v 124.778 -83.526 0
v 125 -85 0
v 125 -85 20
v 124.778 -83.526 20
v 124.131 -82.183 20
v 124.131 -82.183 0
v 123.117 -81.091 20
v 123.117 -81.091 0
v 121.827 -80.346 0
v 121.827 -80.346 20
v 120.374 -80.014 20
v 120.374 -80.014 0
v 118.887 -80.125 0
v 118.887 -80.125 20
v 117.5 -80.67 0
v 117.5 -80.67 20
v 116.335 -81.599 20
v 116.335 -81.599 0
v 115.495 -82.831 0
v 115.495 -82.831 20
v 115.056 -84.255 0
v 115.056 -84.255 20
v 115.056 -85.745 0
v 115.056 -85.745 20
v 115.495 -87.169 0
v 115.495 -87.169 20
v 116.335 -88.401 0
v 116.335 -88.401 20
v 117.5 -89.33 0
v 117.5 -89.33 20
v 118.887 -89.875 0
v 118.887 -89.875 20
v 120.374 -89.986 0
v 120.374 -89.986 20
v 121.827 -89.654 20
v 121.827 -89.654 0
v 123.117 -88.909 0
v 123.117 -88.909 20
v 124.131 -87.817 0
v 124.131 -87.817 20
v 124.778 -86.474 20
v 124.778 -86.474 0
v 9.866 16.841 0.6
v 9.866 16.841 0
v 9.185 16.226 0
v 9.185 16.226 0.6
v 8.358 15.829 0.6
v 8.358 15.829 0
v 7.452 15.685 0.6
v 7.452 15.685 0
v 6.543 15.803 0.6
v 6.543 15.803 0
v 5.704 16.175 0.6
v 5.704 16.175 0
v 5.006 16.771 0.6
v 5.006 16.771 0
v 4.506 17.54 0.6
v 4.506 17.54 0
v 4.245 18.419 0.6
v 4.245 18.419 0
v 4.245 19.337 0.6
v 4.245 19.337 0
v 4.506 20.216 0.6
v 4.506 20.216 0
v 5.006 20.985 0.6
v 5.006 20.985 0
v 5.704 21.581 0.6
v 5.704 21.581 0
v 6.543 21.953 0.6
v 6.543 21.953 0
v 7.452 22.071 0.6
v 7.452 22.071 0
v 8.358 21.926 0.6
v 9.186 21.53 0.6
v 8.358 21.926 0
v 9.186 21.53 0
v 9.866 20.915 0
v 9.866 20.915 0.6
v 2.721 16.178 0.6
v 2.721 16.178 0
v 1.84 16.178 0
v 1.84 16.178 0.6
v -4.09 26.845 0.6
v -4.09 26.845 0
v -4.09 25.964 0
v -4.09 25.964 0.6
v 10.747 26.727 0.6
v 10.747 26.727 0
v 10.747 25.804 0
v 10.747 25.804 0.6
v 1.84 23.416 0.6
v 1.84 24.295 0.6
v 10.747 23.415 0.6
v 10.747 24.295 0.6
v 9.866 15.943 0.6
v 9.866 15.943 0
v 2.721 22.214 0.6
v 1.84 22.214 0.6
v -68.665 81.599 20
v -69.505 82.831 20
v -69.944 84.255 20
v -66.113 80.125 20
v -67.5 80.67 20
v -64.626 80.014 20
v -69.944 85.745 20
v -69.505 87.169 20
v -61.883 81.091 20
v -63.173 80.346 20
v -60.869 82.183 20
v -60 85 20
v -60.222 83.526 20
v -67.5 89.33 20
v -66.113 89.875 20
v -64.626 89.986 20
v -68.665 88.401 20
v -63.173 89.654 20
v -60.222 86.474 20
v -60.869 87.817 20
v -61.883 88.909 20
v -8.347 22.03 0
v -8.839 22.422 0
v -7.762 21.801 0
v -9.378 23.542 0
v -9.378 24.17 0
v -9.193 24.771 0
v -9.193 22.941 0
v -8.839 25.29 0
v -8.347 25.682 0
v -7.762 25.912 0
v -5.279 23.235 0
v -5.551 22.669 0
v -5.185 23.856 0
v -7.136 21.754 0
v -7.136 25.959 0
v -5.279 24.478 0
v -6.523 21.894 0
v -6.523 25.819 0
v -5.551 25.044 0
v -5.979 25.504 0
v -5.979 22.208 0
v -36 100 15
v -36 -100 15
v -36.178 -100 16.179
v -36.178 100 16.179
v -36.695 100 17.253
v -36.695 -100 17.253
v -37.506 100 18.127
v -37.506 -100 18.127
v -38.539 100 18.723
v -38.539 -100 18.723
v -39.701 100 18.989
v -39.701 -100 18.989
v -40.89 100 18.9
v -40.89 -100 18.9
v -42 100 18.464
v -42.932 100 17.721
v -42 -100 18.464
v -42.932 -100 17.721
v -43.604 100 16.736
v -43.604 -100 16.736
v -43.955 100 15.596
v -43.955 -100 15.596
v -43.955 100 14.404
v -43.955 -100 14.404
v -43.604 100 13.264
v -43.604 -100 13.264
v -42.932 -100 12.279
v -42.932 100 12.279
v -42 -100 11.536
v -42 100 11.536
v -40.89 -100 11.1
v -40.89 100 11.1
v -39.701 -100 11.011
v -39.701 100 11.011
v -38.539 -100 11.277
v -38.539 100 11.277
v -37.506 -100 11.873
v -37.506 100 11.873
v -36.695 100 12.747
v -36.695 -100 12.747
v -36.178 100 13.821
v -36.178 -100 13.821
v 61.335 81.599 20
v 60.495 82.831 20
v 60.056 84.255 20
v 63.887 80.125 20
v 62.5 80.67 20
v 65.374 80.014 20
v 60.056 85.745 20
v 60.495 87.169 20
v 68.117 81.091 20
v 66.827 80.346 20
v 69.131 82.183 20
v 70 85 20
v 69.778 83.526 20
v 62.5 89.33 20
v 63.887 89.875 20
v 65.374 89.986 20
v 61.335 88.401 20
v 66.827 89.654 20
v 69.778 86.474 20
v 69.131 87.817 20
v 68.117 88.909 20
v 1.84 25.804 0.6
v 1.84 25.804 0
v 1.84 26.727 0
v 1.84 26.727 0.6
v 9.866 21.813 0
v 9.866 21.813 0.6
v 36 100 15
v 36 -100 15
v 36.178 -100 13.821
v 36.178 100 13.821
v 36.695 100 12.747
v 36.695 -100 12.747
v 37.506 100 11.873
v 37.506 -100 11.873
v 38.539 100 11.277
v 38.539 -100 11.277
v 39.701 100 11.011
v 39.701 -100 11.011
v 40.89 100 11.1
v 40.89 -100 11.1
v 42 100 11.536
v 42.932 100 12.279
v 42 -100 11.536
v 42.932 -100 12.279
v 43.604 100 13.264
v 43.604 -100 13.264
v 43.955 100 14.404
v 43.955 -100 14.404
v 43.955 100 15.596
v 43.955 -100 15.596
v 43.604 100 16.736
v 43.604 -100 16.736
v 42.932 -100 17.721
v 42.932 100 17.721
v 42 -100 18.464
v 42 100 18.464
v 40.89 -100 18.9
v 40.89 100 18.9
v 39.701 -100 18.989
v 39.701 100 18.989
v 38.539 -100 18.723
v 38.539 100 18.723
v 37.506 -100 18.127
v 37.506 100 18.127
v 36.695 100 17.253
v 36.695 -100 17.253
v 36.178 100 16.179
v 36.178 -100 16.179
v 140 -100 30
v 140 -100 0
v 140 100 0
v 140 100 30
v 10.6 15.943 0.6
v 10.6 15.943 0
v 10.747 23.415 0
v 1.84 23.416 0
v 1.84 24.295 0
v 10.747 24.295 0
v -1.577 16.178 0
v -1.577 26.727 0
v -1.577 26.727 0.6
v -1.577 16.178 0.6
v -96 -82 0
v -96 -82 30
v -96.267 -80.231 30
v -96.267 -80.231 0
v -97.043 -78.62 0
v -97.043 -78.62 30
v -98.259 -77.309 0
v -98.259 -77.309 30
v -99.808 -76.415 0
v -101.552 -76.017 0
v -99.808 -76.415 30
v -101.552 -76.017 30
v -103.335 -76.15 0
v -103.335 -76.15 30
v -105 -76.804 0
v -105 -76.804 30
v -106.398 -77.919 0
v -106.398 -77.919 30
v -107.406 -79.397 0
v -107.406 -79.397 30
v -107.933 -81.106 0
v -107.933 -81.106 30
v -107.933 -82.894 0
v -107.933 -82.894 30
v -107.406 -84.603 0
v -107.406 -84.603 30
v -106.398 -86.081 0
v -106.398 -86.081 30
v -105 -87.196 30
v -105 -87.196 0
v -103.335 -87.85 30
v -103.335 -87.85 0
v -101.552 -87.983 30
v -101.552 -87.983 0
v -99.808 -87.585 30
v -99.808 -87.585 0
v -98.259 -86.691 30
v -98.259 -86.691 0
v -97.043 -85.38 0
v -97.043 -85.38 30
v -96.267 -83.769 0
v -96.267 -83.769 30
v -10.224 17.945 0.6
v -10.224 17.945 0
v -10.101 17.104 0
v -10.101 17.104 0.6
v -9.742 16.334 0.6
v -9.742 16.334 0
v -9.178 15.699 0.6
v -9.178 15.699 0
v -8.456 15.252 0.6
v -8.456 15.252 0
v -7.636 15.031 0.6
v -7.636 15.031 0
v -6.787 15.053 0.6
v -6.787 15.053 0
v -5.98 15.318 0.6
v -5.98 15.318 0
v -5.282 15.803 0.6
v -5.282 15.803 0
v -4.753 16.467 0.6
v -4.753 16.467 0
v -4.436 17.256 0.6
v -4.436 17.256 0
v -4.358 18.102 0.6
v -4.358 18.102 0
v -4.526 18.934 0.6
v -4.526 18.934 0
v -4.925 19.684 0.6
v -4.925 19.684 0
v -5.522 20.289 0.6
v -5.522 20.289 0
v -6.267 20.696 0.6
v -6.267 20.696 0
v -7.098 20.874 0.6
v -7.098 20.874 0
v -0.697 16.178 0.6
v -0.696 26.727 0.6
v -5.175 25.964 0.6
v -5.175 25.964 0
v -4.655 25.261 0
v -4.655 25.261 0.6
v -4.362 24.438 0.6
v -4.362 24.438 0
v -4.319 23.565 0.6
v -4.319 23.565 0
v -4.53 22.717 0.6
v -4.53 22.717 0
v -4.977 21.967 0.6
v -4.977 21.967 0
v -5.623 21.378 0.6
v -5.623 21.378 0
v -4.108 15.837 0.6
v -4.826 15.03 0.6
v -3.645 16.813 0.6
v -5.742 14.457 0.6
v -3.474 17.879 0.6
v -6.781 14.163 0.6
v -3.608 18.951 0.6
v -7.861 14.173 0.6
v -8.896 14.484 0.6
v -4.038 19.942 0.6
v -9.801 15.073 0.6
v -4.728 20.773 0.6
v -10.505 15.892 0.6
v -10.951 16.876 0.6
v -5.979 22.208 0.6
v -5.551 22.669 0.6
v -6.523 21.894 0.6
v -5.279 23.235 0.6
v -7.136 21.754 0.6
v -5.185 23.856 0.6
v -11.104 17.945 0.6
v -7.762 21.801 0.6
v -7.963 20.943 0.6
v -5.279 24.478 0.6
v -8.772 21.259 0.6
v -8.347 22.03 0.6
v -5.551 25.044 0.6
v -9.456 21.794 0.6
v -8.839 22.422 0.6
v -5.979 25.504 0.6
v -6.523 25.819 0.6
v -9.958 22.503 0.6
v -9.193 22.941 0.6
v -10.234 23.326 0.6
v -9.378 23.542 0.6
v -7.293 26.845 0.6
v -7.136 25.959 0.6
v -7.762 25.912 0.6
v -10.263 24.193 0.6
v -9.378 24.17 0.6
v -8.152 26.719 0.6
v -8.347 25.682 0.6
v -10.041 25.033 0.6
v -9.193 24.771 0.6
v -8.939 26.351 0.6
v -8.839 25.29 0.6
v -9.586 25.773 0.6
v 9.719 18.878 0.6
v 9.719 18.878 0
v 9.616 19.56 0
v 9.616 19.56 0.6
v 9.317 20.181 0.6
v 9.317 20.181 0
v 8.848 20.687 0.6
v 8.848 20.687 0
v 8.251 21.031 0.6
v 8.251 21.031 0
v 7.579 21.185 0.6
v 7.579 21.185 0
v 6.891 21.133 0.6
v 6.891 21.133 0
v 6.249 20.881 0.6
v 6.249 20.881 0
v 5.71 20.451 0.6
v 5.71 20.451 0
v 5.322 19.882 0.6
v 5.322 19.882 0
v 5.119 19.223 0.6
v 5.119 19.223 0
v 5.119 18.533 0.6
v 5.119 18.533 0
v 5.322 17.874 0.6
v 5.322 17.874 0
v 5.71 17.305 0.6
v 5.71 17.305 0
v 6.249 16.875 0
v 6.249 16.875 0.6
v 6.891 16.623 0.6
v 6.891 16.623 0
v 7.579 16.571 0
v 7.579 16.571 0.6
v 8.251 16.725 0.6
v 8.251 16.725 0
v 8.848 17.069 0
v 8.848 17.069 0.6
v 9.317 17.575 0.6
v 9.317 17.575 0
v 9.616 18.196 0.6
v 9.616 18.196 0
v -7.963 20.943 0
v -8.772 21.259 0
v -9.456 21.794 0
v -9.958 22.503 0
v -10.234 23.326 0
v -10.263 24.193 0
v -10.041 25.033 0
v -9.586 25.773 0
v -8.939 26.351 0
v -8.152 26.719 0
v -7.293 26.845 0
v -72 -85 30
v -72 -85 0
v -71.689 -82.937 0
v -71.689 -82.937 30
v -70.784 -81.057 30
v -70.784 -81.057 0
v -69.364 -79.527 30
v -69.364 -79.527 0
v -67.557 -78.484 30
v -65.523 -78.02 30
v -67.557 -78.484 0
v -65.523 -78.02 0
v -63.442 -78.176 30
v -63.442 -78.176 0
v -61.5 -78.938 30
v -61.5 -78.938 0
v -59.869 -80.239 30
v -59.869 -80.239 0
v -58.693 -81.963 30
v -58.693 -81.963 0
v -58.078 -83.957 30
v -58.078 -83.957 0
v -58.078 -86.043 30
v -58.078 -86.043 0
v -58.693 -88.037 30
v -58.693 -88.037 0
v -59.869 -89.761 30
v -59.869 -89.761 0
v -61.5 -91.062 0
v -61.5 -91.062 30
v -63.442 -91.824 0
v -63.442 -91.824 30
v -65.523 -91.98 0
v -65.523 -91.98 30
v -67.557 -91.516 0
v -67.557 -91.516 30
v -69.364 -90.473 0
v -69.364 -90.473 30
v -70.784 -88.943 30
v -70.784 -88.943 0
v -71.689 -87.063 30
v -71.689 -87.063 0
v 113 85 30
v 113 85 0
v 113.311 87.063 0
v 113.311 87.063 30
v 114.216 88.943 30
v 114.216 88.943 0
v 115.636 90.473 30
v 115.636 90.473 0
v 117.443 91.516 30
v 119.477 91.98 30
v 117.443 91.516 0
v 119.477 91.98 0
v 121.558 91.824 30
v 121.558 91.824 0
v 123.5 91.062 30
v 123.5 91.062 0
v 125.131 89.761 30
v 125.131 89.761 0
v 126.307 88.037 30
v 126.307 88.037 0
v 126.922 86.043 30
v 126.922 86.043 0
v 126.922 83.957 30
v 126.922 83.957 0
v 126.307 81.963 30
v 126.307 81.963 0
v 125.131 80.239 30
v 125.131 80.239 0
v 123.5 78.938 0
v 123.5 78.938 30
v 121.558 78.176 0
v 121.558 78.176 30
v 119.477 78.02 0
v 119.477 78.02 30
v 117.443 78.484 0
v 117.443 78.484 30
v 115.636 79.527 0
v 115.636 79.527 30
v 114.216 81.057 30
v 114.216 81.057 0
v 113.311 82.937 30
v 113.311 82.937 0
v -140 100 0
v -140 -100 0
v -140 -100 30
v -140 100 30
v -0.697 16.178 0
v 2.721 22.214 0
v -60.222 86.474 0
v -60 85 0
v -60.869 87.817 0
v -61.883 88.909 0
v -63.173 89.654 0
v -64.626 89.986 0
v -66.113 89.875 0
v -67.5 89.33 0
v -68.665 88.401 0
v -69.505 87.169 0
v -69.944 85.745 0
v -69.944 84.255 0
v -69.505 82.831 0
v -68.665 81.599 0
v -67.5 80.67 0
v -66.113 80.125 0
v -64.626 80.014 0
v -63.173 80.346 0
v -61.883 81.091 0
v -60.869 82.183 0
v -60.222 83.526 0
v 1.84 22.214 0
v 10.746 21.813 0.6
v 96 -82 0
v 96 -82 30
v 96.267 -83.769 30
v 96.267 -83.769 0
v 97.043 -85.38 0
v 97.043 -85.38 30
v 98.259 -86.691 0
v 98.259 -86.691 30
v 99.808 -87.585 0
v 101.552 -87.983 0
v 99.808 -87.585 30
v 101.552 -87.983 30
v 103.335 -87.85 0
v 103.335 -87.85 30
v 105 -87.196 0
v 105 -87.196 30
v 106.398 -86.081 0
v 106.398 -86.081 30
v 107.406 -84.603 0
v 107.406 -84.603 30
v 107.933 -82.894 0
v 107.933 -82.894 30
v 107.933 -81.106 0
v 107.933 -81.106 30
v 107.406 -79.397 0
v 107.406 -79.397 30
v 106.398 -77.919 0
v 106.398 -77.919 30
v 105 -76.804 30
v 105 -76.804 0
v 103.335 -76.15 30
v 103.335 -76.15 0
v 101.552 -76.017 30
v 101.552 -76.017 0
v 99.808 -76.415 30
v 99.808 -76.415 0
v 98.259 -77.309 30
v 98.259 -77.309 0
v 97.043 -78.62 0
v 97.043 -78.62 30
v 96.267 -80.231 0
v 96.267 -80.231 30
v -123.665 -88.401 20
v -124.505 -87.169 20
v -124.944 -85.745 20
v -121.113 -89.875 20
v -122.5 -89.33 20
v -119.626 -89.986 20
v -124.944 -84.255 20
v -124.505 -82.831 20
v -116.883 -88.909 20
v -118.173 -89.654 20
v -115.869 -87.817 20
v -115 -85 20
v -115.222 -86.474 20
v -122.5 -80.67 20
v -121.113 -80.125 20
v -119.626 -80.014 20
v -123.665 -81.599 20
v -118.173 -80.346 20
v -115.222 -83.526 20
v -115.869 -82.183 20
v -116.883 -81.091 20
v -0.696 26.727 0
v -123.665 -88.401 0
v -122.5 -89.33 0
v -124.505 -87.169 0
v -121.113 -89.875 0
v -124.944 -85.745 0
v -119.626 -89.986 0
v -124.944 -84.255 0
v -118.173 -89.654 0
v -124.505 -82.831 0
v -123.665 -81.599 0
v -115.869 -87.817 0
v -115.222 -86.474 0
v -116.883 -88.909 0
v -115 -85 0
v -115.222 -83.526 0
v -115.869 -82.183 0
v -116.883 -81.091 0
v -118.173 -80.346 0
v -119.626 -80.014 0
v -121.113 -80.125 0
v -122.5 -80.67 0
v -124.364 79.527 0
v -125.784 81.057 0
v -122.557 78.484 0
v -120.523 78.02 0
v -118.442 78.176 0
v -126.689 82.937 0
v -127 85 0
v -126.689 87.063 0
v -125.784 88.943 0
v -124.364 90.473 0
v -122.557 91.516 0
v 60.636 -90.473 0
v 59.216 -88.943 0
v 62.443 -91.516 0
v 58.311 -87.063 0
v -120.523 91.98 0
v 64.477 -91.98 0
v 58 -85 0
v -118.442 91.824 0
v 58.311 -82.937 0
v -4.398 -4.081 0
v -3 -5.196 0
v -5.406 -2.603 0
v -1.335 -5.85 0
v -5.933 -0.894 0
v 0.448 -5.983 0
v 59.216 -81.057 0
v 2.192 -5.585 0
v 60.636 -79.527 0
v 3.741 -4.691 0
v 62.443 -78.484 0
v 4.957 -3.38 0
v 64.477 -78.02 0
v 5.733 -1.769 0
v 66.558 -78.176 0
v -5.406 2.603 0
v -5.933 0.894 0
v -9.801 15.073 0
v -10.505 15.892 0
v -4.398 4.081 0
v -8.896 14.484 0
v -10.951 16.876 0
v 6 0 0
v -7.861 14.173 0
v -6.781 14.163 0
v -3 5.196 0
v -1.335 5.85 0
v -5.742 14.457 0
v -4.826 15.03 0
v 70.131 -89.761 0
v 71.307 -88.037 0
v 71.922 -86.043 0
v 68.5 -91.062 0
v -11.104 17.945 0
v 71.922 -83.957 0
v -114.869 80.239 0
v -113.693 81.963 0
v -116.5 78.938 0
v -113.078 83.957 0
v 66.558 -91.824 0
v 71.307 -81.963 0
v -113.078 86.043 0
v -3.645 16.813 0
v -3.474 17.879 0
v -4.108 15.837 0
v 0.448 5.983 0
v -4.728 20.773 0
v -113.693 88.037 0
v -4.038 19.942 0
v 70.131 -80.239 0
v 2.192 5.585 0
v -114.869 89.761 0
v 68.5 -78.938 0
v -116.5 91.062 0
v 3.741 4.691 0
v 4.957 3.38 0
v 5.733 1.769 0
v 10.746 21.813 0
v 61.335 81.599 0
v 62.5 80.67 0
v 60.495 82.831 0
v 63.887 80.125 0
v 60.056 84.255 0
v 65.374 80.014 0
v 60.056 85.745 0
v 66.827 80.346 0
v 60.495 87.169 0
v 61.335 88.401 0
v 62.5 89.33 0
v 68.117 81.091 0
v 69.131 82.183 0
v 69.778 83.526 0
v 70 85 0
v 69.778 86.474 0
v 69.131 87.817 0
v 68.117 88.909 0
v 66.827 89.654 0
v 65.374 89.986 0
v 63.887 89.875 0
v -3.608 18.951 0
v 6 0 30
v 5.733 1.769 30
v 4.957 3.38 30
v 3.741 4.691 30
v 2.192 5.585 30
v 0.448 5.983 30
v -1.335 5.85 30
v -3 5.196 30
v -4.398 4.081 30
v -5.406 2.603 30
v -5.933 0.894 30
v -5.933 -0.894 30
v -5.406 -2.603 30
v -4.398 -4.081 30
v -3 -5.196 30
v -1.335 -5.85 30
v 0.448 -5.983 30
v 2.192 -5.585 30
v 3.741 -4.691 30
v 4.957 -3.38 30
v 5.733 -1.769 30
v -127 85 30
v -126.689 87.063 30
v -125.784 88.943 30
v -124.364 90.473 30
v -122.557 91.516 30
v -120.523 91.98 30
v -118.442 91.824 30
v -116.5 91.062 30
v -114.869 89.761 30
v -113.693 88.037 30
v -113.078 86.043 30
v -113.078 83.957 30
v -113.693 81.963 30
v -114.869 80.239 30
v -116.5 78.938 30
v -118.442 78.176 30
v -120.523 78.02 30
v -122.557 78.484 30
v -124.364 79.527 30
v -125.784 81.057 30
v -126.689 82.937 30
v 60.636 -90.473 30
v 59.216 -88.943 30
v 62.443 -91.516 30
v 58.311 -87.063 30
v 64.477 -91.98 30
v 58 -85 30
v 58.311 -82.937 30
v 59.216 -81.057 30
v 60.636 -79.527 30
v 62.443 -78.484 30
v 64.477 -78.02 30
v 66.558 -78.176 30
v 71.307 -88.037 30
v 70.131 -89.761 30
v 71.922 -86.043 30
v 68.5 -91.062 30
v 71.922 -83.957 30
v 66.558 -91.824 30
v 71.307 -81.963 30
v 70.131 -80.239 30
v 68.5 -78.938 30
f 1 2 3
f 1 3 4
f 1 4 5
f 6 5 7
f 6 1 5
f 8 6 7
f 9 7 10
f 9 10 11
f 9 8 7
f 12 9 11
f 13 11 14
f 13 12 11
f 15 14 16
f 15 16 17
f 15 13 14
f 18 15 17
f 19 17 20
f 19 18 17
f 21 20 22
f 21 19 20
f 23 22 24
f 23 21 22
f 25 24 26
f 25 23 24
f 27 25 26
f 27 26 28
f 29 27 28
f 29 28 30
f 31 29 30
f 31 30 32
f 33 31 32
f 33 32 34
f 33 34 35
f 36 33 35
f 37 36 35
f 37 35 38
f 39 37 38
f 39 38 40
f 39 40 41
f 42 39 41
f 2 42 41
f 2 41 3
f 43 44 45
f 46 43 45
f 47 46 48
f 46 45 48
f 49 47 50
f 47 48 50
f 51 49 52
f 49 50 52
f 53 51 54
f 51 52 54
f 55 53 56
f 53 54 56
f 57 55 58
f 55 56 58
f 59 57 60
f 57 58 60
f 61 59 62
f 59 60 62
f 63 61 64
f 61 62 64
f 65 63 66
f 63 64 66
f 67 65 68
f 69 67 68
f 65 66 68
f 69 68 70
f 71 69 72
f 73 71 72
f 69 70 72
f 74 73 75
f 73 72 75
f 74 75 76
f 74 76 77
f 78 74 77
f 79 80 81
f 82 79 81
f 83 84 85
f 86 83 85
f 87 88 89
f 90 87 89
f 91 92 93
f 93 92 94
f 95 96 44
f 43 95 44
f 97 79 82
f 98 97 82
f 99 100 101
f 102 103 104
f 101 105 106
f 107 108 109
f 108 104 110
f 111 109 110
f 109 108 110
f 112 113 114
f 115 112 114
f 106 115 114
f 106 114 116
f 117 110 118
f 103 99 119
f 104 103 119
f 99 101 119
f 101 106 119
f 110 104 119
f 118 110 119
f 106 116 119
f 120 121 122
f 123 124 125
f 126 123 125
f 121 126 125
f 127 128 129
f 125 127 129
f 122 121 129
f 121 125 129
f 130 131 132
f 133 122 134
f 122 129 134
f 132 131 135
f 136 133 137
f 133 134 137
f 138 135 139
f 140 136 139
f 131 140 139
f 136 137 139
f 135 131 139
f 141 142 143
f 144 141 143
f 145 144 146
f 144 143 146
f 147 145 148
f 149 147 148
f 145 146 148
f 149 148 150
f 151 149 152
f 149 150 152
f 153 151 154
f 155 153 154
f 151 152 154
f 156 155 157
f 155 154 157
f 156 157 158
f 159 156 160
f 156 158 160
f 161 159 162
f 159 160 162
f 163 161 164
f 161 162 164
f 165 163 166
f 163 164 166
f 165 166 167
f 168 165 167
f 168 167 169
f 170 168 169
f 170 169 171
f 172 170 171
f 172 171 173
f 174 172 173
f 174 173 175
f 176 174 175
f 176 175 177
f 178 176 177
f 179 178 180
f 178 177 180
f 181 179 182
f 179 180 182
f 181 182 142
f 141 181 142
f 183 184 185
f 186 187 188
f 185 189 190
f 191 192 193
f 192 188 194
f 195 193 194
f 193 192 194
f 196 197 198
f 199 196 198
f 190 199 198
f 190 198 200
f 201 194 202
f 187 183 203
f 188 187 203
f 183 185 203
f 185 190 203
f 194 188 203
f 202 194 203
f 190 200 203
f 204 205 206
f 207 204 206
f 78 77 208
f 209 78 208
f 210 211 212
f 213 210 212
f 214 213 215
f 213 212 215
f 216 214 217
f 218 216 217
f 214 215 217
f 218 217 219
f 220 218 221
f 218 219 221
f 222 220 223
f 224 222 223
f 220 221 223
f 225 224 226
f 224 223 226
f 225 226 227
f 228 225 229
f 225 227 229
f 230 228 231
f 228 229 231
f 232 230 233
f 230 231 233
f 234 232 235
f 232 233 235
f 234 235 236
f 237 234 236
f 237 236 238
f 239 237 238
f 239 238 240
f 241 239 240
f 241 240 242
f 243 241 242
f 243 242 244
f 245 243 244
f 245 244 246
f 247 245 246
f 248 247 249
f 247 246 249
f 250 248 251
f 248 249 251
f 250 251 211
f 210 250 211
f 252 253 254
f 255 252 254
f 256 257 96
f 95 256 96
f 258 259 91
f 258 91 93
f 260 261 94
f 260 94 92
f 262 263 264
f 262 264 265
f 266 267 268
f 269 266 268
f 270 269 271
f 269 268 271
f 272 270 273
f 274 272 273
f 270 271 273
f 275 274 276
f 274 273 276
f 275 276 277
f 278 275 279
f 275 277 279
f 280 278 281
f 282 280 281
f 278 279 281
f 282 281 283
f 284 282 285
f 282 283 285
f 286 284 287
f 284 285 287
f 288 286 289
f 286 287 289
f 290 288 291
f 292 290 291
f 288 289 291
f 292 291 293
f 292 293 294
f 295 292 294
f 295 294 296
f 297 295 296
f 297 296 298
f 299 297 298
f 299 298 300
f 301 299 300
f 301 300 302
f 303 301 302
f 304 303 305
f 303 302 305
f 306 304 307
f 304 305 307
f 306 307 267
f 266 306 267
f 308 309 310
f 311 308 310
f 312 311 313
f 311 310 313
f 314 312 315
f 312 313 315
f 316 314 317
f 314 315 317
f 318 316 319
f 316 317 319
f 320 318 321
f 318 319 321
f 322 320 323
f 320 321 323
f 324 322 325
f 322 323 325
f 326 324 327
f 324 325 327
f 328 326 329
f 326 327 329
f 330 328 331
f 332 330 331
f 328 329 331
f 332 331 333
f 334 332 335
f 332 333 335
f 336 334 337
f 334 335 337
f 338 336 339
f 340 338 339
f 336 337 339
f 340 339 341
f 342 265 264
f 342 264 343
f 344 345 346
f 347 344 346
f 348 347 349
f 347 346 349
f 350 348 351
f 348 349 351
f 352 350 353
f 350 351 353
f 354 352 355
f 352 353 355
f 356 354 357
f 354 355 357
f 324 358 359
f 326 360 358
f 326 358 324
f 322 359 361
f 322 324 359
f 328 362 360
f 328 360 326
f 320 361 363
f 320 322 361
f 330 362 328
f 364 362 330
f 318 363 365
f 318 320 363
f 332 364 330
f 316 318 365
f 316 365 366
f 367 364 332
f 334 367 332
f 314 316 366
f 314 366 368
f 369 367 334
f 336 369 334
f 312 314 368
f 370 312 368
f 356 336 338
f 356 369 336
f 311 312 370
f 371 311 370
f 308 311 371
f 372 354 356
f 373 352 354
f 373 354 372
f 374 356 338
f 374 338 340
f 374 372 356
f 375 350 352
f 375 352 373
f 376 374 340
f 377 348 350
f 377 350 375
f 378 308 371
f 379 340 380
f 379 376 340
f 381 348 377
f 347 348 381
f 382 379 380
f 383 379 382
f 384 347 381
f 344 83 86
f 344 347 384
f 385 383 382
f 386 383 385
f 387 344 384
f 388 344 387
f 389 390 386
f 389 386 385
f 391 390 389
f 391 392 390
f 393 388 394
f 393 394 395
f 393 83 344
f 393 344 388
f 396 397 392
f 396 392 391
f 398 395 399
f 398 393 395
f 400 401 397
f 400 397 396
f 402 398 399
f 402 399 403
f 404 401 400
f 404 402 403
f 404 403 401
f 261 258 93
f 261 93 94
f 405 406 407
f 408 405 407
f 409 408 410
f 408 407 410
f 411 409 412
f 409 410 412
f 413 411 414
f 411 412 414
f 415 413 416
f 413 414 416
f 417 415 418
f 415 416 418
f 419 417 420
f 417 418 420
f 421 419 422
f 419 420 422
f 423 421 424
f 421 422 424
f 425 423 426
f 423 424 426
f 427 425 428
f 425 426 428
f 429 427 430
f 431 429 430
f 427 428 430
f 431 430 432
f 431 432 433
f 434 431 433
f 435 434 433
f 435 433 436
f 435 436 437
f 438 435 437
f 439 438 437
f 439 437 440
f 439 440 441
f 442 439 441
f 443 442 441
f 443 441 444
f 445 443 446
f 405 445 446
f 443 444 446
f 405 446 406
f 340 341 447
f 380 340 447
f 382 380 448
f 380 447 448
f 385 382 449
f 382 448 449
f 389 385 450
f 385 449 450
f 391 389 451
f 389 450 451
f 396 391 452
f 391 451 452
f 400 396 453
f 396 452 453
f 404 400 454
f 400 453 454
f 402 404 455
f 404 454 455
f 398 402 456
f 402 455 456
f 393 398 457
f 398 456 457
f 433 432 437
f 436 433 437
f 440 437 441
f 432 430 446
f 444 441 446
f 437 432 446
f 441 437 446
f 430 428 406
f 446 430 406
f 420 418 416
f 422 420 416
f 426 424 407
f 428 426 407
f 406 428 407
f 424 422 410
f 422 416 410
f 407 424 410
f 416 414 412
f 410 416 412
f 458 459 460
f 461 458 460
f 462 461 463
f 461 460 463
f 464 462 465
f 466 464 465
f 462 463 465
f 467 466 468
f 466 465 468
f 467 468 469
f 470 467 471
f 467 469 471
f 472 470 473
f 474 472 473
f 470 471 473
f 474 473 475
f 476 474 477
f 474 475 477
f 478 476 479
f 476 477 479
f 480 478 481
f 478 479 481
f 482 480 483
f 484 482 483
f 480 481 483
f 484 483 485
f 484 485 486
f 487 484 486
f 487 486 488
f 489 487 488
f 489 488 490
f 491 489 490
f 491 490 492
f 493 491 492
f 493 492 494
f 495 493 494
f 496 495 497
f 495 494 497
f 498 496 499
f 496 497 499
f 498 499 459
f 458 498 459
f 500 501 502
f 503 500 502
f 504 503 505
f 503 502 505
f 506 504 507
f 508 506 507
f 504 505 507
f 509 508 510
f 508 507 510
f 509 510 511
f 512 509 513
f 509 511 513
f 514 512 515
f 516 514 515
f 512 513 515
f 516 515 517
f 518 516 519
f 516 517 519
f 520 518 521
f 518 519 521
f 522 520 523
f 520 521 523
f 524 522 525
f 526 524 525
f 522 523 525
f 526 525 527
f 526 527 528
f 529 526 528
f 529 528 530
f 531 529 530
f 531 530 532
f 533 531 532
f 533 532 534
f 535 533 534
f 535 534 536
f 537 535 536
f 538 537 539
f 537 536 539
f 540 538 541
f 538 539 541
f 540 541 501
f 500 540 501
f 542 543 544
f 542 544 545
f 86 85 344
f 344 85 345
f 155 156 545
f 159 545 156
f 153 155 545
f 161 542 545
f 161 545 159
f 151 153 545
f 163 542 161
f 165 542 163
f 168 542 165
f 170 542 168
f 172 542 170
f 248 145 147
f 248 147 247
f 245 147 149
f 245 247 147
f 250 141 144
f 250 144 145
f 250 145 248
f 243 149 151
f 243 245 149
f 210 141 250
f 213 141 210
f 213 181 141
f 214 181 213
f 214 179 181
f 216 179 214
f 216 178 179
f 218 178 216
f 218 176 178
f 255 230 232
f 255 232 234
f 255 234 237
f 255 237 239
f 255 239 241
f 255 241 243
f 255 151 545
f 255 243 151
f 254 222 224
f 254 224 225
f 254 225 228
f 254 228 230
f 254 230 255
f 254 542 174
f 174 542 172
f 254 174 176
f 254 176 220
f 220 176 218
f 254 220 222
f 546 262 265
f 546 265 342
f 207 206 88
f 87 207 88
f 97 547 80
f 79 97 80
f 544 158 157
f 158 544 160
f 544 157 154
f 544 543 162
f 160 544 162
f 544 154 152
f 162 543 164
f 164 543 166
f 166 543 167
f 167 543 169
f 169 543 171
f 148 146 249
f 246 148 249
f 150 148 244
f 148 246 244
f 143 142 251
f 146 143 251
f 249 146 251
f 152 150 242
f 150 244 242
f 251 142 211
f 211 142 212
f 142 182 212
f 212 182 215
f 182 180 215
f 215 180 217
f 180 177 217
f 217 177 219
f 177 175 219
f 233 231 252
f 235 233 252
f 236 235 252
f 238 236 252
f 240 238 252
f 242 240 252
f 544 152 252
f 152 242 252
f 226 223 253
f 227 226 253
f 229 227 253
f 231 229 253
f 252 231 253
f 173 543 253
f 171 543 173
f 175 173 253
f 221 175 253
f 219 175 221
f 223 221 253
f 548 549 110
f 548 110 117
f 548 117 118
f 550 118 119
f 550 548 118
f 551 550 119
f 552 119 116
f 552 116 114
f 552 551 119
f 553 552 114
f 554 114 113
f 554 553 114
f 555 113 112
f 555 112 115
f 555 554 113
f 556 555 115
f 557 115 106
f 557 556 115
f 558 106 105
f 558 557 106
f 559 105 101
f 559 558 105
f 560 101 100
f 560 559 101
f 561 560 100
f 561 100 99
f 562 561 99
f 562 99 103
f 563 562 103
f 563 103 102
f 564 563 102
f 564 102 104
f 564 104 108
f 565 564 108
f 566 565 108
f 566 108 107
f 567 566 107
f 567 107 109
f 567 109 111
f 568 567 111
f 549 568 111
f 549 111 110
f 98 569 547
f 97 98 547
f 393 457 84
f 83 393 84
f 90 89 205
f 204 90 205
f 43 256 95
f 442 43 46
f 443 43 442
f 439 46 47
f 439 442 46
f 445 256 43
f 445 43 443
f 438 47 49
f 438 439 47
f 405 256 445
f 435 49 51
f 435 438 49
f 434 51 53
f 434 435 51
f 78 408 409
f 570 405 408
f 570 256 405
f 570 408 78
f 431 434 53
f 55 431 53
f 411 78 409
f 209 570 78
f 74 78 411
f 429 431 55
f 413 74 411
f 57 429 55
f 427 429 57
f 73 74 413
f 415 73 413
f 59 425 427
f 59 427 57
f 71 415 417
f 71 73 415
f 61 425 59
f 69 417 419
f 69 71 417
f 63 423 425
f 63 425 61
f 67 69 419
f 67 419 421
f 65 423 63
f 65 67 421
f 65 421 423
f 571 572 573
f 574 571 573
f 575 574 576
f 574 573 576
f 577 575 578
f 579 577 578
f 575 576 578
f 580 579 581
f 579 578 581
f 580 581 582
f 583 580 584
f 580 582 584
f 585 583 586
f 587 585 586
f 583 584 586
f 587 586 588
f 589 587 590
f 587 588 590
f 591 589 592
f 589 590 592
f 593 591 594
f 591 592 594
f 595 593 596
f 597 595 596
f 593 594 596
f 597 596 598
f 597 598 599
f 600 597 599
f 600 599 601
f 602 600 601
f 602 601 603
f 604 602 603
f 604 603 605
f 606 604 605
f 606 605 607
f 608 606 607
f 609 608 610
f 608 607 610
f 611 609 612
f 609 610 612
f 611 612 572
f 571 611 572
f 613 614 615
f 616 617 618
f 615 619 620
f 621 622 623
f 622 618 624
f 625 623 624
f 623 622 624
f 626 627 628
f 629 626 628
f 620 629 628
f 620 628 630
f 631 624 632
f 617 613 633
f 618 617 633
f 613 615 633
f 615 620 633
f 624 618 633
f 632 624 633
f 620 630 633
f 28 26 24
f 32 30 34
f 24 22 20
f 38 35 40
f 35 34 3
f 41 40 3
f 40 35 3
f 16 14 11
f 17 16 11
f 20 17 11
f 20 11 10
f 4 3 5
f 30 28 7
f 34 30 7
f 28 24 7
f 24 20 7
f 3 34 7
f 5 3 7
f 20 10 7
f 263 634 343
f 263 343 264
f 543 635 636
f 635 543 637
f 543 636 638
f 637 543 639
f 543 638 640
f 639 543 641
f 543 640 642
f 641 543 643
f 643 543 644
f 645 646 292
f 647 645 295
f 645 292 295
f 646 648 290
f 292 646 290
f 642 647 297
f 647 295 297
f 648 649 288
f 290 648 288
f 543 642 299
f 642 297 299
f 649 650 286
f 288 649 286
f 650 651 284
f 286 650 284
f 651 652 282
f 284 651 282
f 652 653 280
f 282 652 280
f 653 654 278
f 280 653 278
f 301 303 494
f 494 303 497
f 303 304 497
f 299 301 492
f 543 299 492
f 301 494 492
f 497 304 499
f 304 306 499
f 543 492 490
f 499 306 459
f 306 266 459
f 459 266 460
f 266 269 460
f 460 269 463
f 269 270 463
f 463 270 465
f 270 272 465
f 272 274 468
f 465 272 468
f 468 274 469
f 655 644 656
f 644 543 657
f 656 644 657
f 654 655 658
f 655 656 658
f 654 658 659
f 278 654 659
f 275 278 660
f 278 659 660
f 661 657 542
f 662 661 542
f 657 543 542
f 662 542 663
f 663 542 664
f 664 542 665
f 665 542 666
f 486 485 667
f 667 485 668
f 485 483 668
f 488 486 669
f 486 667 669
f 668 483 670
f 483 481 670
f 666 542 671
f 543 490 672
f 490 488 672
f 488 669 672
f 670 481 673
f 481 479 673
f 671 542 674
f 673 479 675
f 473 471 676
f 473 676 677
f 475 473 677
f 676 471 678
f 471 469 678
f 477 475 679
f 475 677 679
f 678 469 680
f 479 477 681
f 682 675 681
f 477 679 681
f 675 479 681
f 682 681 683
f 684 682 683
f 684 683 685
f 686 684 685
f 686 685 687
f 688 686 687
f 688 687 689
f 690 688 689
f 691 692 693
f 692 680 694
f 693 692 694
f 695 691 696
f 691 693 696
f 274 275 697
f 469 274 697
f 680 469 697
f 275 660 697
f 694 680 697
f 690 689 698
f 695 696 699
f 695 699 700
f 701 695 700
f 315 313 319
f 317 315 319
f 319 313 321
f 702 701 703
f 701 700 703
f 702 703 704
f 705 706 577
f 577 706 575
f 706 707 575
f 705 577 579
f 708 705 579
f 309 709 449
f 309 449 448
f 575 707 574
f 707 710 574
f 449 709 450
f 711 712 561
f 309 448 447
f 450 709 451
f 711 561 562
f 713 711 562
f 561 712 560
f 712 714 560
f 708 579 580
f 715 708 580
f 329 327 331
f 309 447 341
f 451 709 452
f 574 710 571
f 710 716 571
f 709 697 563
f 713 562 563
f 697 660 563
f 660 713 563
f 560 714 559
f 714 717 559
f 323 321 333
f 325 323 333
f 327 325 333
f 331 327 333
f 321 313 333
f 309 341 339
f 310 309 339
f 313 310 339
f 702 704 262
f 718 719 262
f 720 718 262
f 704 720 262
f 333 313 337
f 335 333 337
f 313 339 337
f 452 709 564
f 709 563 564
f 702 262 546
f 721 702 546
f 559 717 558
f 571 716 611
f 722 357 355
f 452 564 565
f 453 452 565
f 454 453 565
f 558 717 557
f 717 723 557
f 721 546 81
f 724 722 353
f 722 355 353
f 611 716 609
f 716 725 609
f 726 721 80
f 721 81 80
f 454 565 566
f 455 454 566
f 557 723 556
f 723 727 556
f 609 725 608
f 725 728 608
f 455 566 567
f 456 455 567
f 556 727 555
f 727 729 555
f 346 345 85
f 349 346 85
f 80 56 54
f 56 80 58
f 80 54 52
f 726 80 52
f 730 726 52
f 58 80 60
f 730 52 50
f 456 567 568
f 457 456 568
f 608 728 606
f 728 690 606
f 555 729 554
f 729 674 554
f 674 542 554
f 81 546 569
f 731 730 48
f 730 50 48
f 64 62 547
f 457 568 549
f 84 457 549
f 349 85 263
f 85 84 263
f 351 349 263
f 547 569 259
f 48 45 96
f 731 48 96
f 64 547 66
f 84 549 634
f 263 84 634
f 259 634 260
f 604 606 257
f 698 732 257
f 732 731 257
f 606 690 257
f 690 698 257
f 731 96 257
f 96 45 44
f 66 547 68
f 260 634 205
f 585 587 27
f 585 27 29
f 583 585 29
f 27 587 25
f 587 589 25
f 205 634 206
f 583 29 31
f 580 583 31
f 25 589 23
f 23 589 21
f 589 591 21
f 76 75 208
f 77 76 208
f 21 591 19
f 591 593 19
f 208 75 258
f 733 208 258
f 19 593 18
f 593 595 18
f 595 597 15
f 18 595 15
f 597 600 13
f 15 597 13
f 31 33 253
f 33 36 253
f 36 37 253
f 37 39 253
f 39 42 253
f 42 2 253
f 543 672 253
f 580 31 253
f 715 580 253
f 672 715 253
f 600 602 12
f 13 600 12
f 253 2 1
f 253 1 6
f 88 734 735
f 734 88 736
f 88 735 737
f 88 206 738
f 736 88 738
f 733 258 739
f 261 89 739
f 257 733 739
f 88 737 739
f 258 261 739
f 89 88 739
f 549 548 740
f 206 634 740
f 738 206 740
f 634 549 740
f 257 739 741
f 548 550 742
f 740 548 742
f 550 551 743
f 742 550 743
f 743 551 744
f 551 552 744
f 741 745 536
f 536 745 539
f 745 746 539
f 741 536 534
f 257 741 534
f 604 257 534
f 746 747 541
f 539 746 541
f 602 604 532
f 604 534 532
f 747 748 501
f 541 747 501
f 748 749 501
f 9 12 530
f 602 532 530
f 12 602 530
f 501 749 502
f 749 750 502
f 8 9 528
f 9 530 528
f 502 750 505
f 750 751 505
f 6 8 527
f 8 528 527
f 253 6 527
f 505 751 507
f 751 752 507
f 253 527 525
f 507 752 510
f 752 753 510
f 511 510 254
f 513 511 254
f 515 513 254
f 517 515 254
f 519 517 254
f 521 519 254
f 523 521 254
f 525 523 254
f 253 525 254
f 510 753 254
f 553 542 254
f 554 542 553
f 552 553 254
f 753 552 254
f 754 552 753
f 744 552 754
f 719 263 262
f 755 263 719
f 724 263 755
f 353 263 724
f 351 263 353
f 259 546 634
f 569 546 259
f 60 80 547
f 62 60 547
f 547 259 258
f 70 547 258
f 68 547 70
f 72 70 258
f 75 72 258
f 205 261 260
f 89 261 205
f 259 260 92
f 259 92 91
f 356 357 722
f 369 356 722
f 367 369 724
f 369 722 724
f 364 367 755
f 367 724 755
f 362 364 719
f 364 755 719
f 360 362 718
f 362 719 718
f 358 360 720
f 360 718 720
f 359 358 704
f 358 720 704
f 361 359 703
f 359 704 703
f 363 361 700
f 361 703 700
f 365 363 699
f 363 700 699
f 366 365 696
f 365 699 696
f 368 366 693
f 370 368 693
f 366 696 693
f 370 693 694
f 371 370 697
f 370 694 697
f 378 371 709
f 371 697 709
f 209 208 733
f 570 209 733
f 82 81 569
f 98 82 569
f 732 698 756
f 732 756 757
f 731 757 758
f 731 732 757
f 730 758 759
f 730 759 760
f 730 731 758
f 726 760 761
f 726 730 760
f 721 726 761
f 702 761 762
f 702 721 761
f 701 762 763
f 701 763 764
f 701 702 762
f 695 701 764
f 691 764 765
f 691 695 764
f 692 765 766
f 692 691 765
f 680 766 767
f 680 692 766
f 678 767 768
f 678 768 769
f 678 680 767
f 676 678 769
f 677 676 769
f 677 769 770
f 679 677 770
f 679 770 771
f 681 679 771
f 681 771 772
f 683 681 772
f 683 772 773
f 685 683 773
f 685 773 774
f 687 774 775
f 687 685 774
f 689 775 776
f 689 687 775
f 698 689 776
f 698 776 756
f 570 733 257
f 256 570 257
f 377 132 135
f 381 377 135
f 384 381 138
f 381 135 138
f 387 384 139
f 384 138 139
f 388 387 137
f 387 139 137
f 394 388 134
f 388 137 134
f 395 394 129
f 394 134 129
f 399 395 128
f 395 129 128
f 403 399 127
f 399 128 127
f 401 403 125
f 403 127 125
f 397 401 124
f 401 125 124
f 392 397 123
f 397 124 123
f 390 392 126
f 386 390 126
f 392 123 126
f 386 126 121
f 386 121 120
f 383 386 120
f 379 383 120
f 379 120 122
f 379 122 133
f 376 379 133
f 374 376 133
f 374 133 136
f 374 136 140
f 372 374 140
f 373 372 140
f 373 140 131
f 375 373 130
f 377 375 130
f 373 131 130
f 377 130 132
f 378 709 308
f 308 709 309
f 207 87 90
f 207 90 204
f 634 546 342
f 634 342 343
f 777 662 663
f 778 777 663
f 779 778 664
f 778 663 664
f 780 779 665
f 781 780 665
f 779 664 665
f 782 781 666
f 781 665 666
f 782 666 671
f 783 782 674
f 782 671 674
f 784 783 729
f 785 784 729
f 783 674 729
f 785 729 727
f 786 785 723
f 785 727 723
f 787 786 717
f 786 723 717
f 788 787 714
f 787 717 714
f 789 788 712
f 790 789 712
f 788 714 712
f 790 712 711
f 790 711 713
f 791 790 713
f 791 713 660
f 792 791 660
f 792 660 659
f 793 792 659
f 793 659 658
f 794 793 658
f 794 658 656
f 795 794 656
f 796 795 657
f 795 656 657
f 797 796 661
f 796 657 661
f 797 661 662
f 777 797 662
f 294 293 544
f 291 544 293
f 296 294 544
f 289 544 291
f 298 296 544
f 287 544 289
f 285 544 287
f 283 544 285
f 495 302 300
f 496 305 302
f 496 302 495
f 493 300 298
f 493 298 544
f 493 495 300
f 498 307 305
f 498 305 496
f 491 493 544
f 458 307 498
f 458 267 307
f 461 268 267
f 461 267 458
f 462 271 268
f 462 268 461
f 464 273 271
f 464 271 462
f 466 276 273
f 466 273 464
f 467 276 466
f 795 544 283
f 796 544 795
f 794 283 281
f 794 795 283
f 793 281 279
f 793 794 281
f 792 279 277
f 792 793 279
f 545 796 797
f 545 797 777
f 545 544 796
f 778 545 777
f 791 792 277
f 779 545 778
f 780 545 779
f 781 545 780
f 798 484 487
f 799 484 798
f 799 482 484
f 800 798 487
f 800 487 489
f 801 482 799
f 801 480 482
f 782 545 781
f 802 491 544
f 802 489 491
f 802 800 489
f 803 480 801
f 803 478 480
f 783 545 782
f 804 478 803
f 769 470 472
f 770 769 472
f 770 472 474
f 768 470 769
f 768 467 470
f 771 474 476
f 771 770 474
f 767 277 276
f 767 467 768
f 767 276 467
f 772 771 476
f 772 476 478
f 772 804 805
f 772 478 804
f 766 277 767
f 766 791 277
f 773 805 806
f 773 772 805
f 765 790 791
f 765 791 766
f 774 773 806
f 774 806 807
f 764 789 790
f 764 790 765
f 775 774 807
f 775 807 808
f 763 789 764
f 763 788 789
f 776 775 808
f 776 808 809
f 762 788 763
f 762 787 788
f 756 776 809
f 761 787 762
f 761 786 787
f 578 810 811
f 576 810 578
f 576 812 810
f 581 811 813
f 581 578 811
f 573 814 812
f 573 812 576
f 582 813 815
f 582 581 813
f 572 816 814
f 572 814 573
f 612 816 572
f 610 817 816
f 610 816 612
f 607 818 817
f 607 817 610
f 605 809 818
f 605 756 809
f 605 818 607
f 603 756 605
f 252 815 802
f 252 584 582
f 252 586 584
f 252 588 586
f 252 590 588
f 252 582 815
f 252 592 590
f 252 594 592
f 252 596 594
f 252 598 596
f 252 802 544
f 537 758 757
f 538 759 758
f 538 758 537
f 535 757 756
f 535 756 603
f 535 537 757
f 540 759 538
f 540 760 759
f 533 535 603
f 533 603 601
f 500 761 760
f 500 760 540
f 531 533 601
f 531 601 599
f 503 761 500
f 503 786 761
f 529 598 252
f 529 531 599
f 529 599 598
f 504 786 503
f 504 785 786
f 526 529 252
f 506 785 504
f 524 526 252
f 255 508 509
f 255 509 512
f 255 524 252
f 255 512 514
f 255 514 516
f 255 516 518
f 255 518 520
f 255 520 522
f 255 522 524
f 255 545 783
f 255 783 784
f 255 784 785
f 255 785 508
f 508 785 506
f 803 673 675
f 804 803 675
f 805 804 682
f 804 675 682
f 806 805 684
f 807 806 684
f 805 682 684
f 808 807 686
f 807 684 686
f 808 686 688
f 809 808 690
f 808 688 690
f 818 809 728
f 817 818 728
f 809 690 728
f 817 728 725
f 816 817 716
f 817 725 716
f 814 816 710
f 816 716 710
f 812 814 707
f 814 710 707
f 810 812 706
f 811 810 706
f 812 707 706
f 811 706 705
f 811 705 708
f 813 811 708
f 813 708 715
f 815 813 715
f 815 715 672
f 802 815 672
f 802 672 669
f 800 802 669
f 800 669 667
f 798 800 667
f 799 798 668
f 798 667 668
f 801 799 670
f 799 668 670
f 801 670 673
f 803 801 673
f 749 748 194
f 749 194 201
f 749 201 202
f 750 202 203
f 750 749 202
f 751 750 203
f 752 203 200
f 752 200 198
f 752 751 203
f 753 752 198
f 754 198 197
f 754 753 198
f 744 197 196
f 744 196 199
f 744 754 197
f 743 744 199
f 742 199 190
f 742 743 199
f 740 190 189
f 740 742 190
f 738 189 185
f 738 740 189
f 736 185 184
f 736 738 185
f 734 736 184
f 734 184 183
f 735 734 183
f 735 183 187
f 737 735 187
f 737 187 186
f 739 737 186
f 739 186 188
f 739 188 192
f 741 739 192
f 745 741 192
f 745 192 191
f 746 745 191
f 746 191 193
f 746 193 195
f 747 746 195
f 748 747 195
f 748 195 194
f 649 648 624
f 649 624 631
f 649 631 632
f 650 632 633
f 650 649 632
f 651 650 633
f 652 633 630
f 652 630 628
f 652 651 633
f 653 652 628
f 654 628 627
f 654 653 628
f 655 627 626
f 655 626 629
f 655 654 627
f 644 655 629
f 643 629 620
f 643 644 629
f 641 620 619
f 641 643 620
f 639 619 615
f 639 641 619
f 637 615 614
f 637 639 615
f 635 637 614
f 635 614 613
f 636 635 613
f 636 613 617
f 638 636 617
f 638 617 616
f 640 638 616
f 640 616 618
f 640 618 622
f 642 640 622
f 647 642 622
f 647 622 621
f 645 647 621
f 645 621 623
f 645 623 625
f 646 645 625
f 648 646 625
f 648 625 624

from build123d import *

# Parameters (mm, degrees)
SKETCH1_W           = 280
SKETCH1_H           = 200
SKETCH1_R           = 5
SKETCH1_R_2         = 6
BOSS_EXTRUDE1_DEPTH = 30
SKETCH2_R           = 7
CUT_EXTRUDE1_DEPTH  = 30
BOSS_EXTRUDE3_START = -10
SKETCH3_R           = 5
BOSS_EXTRUDE3_DEPTH = 10
SKETCH4_R           = 6
CUT_EXTRUDE2_DEPTH  = 30
SKETCH5_R           = 4
CUT_EXTRUDE3_DEPTH  = 200
SKETCH6_R           = 2.108291455
SKETCH6_R_2         = 2.313215084
CUT_EXTRUDE7_DEPTH  = 0.6


with BuildPart() as part:
    # Sketch1 → Boss-Extrude1 (new body)
    with BuildSketch(Plane.XY):
        Rectangle(SKETCH1_W, SKETCH1_H)
        with Locations((-120, -85)):
            Circle(SKETCH1_R, mode=Mode.SUBTRACT)
        with Locations((120, -85)):
            Circle(SKETCH1_R, mode=Mode.SUBTRACT)
        with Locations((-65, -85)):
            Circle(SKETCH1_R, mode=Mode.SUBTRACT)
        with Locations((65, -85)):
            Circle(SKETCH1_R, mode=Mode.SUBTRACT)
        with Locations((65, 85)):
            Circle(SKETCH1_R, mode=Mode.SUBTRACT)
        with Locations((-65, 85)):
            Circle(SKETCH1_R, mode=Mode.SUBTRACT)
        with Locations((-120, 85)):
            Circle(SKETCH1_R, mode=Mode.SUBTRACT)
        with Locations((120, 85)):
            Circle(SKETCH1_R, mode=Mode.SUBTRACT)
        Circle(SKETCH1_R_2, mode=Mode.SUBTRACT)
    extrude(amount=BOSS_EXTRUDE1_DEPTH)

    # Sketch2 → Cut-Extrude1 (cut)
    with BuildSketch(Plane(origin=(0, 0, 0), x_dir=(-1, 0, 0), z_dir=(0, 0, -1))):
        with Locations((-120, 85)):
            Circle(SKETCH2_R)
        with Locations((120, 85)):
            Circle(SKETCH2_R)
        with Locations((65, -85)):
            Circle(SKETCH2_R)
        with Locations((-65, -85)):
            Circle(SKETCH2_R)
    extrude(amount=-CUT_EXTRUDE1_DEPTH, mode=Mode.SUBTRACT)

    # Sketch3 → Boss-Extrude3 (add)
    with BuildSketch(Plane.XY.offset(30).offset(BOSS_EXTRUDE3_START)):
        with Locations((-120, -85)):
            Circle(SKETCH3_R)
        with Locations((120, -85)):
            Circle(SKETCH3_R)
        with Locations((-65, 85)):
            Circle(SKETCH3_R)
        with Locations((65, 85)):
            Circle(SKETCH3_R)
    extrude(amount=BOSS_EXTRUDE3_DEPTH)

    # Sketch4 → Cut-Extrude2 (cut)
    with BuildSketch(Plane.XY.offset(30)):
        with Locations((-102, -82)):
            Circle(SKETCH4_R)
        with Locations(Location((102, -82, 0), (0, 0, 180))):
            Circle(SKETCH4_R)
    extrude(amount=-CUT_EXTRUDE2_DEPTH, mode=Mode.SUBTRACT)

    # Sketch5 → Cut-Extrude3 (cut)
    with BuildSketch(Plane(origin=(0, -100, 0), x_dir=(-1, 0, 0), z_dir=(0, -1, 0))):
        with Locations(Location((40, -15, 0), (0, 0, 180))):
            Circle(SKETCH5_R)
        with Locations((-40, -15)):
            Circle(SKETCH5_R)
    extrude(amount=-CUT_EXTRUDE3_DEPTH, mode=Mode.SUBTRACT)

    # Sketch6 → Cut-Extrude7 (cut)
    # profile 1 of 6: a face of its own
    with BuildSketch(Plane.XY):
        with BuildLine():
            Line((-11.104324014, 17.945069254), (-10.223815884, 17.945042681))
            ThreePointArc((-10.223815884, 17.945042681), (-5.282103106, 15.803086541), (-7.097802531, 20.873760745))
            ThreePointArc((-7.097802531, 20.873760745), (-10.28034524, 23.758493076), (-7.293051975, 26.844969654))
            Line((-7.293051975, 26.844969654), (-4.090157048, 26.844872994))
            Line((-4.090157048, 26.844872994), (-4.090183621, 25.964364865))
            Line((-4.090183621, 25.964364865), (-5.174581416, 25.964397591))
            ThreePointArc((-5.174581416, 25.964397591), (-4.318518193, 23.565420803), (-5.622908359, 21.377613643))
            ThreePointArc((-5.622908359, 21.377613643), (-5.263734666, 14.711153724), (-11.104324014, 17.945069254))
        make_face()
        with Locations((-7.293142173, 23.85617007)):
            Circle(SKETCH6_R, mode=Mode.SUBTRACT)
    # profile 2 of 6: a face of its own
    with BuildSketch(Plane.XY):
        Polygon((1.840305593, 22.213875796), (2.720813722, 22.213849223), (2.720631568, 16.17802246), (1.840123439, 16.178049033), align=None)
    # profile 3 of 6: a face of its own
    with BuildSketch(Plane.XY):
        Polygon((-1.577208157, 16.178152164), (-0.696700027, 16.178125591), (-0.696381672, 26.727084122), (-1.576889802, 26.727110694), align=None)
    # profile 4 of 6: a face of its own
    with BuildSketch(Plane.XY):
        with BuildLine():
            Line((9.865957526, 20.914655791), (9.865984634, 21.812912632))
            Line((9.865984634, 21.812912632), (10.746492764, 21.81288606))
            Line((10.746492764, 21.81288606), (10.599564257, 15.942836291))
            Line((10.599564257, 15.942836291), (9.865807483, 15.942858434))
            Line((9.865807483, 15.942858434), (9.865834591, 16.841115276))
            ThreePointArc((9.865834591, 16.841115276), (4.212206408, 18.878056155), (9.865957526, 20.914655791))
        make_face()
        with Locations((7.40592962, 18.877959772)):
            Circle(SKETCH6_R_2, mode=Mode.SUBTRACT)
    # profile 5 of 6: a face of its own
    with BuildSketch(Plane.XY):
        Polygon((1.84041394, 25.804070666), (1.840441794, 26.727007563), (10.746641058, 26.726738785), (10.746613205, 25.803801888), align=None)
    # profile 6 of 6: a face of its own
    with BuildSketch(Plane.XY):
        Polygon((1.840341861, 23.415664961), (10.746541125, 23.415396183), (10.746567668, 24.294913294), (1.840368404, 24.295182072), align=None)
    extrude(amount=CUT_EXTRUDE7_DEPTH, mode=Mode.SUBTRACT)


solid = part.part
